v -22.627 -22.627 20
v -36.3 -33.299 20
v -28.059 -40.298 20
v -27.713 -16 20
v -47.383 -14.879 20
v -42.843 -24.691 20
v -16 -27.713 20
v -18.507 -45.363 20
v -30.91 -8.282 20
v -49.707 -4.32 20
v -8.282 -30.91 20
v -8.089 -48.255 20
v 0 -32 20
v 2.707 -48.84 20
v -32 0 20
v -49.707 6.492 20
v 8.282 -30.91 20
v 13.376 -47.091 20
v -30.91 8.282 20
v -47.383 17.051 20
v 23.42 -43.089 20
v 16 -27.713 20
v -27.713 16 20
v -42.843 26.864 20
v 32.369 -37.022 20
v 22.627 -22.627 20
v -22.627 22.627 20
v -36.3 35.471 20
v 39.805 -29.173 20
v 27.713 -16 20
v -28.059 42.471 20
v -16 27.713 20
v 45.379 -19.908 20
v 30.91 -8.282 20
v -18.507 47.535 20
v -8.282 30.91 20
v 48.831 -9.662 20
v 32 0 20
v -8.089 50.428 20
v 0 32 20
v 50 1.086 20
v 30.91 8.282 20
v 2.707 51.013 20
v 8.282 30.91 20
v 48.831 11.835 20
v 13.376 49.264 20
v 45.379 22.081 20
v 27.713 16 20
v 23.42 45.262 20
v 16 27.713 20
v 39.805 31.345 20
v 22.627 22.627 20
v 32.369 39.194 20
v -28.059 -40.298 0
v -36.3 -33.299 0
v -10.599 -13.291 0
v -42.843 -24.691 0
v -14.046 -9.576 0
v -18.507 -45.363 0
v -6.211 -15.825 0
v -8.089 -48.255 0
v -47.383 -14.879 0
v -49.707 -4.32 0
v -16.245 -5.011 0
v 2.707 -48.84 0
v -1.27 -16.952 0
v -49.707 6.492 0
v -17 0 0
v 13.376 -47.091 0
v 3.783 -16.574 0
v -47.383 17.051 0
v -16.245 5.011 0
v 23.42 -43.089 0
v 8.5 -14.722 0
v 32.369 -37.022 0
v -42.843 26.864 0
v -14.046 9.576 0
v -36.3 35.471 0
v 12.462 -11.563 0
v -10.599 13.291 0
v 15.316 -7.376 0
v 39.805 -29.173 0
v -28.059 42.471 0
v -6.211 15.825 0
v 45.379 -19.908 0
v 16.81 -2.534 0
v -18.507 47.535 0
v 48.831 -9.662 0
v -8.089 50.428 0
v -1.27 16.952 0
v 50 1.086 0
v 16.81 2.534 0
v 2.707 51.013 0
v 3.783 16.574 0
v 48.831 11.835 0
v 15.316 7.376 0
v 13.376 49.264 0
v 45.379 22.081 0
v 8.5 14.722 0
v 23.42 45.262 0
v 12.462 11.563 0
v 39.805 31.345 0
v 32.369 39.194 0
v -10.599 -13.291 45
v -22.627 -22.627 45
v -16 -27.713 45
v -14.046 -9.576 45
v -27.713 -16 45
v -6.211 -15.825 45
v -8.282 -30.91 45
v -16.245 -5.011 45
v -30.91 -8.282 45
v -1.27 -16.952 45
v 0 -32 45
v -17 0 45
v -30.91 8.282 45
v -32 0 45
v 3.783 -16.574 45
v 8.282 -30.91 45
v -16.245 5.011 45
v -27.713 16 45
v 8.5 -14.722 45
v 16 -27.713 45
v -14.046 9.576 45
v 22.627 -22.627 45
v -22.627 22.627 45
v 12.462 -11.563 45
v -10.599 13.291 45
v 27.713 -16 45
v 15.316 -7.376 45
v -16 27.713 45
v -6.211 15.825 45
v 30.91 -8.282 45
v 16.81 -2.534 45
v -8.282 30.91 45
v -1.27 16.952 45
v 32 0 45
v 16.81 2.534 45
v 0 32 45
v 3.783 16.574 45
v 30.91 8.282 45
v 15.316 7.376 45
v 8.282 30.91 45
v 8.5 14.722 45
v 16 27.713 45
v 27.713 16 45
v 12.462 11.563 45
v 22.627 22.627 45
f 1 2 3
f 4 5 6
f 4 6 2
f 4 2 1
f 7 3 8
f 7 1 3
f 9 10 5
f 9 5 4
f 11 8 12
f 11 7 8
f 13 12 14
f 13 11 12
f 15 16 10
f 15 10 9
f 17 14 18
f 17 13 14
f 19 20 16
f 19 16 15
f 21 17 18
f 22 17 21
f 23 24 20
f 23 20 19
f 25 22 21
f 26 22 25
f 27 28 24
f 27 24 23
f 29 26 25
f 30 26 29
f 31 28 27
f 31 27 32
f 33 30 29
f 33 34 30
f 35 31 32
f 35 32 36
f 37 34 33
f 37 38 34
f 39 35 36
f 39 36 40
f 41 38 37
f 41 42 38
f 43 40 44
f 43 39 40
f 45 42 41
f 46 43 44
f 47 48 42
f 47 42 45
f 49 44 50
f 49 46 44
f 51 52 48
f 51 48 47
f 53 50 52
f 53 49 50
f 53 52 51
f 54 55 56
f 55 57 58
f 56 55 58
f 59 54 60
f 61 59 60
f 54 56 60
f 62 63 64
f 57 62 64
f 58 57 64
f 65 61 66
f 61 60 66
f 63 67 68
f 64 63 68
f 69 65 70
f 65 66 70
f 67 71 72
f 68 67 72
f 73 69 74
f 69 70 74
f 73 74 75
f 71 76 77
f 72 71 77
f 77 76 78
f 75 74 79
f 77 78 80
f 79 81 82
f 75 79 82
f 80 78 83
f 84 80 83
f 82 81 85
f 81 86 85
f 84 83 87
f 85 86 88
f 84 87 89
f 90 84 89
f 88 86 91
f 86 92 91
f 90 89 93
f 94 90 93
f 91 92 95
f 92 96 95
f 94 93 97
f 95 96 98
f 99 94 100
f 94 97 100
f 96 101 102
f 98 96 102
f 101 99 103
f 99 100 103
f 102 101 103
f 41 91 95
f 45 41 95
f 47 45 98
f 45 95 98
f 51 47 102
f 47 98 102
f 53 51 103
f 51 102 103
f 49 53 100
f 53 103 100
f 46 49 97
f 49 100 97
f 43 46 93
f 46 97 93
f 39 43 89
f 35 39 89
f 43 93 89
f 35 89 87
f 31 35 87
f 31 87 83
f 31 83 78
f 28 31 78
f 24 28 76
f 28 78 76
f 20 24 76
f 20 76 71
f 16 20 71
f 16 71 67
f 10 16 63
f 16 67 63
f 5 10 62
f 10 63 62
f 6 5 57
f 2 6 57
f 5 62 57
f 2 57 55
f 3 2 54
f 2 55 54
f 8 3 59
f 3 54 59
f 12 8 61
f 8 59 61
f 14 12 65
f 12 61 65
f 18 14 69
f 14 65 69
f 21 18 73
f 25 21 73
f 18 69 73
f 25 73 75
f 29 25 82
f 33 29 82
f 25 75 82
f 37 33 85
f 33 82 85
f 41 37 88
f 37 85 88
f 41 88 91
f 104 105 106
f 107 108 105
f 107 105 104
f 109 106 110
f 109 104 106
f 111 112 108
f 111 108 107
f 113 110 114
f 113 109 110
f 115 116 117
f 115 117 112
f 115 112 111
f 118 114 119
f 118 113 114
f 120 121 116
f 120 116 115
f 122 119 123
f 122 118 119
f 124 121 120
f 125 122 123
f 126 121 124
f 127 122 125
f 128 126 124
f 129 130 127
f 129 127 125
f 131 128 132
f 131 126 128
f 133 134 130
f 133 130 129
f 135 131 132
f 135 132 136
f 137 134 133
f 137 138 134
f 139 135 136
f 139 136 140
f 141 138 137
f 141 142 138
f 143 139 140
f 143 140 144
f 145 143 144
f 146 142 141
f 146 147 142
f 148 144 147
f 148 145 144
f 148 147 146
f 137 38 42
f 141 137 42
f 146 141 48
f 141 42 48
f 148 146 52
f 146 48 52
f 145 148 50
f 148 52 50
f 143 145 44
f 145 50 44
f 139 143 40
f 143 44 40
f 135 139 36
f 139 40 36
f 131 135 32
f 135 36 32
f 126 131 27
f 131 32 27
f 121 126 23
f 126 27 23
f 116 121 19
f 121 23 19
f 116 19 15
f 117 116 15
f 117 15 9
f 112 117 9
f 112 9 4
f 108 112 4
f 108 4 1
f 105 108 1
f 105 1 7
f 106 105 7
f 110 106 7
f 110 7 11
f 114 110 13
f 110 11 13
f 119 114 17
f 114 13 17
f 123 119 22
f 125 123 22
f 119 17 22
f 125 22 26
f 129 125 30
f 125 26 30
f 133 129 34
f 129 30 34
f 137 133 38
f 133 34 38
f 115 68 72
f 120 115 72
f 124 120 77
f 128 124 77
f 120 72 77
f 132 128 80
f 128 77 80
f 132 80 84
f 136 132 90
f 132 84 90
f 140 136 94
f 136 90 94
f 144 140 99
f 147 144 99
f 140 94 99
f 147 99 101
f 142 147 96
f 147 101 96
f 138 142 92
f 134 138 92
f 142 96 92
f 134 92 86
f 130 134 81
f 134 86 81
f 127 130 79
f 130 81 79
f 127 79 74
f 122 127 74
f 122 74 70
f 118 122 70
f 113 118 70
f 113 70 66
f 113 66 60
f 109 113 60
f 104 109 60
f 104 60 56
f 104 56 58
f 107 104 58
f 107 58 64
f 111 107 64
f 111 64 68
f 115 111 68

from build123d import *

# Parameters (mm, degrees)
F0_R     = 50
F1_DEPTH = 20
F2_R     = 32
F3_DEPTH = 25
F5_D     = 34


with BuildPart() as f1:
    # F0 (on Top) → F1 (new body)
    with BuildSketch(Plane.XY):
        with Locations((0, 1.086205)):
            Circle(F0_R)
    extrude(amount=F1_DEPTH)

    # F2 (on face) → F3 (join)
    with BuildSketch(Plane.XY.offset(20)):
        Circle(F2_R)
    extrude(amount=F3_DEPTH)

    # F5 (through all)
    with Locations(Plane.XY.offset(45)):
        with Locations((0, 0)):
            Hole(F5_D / 2)


solid = f1.part
